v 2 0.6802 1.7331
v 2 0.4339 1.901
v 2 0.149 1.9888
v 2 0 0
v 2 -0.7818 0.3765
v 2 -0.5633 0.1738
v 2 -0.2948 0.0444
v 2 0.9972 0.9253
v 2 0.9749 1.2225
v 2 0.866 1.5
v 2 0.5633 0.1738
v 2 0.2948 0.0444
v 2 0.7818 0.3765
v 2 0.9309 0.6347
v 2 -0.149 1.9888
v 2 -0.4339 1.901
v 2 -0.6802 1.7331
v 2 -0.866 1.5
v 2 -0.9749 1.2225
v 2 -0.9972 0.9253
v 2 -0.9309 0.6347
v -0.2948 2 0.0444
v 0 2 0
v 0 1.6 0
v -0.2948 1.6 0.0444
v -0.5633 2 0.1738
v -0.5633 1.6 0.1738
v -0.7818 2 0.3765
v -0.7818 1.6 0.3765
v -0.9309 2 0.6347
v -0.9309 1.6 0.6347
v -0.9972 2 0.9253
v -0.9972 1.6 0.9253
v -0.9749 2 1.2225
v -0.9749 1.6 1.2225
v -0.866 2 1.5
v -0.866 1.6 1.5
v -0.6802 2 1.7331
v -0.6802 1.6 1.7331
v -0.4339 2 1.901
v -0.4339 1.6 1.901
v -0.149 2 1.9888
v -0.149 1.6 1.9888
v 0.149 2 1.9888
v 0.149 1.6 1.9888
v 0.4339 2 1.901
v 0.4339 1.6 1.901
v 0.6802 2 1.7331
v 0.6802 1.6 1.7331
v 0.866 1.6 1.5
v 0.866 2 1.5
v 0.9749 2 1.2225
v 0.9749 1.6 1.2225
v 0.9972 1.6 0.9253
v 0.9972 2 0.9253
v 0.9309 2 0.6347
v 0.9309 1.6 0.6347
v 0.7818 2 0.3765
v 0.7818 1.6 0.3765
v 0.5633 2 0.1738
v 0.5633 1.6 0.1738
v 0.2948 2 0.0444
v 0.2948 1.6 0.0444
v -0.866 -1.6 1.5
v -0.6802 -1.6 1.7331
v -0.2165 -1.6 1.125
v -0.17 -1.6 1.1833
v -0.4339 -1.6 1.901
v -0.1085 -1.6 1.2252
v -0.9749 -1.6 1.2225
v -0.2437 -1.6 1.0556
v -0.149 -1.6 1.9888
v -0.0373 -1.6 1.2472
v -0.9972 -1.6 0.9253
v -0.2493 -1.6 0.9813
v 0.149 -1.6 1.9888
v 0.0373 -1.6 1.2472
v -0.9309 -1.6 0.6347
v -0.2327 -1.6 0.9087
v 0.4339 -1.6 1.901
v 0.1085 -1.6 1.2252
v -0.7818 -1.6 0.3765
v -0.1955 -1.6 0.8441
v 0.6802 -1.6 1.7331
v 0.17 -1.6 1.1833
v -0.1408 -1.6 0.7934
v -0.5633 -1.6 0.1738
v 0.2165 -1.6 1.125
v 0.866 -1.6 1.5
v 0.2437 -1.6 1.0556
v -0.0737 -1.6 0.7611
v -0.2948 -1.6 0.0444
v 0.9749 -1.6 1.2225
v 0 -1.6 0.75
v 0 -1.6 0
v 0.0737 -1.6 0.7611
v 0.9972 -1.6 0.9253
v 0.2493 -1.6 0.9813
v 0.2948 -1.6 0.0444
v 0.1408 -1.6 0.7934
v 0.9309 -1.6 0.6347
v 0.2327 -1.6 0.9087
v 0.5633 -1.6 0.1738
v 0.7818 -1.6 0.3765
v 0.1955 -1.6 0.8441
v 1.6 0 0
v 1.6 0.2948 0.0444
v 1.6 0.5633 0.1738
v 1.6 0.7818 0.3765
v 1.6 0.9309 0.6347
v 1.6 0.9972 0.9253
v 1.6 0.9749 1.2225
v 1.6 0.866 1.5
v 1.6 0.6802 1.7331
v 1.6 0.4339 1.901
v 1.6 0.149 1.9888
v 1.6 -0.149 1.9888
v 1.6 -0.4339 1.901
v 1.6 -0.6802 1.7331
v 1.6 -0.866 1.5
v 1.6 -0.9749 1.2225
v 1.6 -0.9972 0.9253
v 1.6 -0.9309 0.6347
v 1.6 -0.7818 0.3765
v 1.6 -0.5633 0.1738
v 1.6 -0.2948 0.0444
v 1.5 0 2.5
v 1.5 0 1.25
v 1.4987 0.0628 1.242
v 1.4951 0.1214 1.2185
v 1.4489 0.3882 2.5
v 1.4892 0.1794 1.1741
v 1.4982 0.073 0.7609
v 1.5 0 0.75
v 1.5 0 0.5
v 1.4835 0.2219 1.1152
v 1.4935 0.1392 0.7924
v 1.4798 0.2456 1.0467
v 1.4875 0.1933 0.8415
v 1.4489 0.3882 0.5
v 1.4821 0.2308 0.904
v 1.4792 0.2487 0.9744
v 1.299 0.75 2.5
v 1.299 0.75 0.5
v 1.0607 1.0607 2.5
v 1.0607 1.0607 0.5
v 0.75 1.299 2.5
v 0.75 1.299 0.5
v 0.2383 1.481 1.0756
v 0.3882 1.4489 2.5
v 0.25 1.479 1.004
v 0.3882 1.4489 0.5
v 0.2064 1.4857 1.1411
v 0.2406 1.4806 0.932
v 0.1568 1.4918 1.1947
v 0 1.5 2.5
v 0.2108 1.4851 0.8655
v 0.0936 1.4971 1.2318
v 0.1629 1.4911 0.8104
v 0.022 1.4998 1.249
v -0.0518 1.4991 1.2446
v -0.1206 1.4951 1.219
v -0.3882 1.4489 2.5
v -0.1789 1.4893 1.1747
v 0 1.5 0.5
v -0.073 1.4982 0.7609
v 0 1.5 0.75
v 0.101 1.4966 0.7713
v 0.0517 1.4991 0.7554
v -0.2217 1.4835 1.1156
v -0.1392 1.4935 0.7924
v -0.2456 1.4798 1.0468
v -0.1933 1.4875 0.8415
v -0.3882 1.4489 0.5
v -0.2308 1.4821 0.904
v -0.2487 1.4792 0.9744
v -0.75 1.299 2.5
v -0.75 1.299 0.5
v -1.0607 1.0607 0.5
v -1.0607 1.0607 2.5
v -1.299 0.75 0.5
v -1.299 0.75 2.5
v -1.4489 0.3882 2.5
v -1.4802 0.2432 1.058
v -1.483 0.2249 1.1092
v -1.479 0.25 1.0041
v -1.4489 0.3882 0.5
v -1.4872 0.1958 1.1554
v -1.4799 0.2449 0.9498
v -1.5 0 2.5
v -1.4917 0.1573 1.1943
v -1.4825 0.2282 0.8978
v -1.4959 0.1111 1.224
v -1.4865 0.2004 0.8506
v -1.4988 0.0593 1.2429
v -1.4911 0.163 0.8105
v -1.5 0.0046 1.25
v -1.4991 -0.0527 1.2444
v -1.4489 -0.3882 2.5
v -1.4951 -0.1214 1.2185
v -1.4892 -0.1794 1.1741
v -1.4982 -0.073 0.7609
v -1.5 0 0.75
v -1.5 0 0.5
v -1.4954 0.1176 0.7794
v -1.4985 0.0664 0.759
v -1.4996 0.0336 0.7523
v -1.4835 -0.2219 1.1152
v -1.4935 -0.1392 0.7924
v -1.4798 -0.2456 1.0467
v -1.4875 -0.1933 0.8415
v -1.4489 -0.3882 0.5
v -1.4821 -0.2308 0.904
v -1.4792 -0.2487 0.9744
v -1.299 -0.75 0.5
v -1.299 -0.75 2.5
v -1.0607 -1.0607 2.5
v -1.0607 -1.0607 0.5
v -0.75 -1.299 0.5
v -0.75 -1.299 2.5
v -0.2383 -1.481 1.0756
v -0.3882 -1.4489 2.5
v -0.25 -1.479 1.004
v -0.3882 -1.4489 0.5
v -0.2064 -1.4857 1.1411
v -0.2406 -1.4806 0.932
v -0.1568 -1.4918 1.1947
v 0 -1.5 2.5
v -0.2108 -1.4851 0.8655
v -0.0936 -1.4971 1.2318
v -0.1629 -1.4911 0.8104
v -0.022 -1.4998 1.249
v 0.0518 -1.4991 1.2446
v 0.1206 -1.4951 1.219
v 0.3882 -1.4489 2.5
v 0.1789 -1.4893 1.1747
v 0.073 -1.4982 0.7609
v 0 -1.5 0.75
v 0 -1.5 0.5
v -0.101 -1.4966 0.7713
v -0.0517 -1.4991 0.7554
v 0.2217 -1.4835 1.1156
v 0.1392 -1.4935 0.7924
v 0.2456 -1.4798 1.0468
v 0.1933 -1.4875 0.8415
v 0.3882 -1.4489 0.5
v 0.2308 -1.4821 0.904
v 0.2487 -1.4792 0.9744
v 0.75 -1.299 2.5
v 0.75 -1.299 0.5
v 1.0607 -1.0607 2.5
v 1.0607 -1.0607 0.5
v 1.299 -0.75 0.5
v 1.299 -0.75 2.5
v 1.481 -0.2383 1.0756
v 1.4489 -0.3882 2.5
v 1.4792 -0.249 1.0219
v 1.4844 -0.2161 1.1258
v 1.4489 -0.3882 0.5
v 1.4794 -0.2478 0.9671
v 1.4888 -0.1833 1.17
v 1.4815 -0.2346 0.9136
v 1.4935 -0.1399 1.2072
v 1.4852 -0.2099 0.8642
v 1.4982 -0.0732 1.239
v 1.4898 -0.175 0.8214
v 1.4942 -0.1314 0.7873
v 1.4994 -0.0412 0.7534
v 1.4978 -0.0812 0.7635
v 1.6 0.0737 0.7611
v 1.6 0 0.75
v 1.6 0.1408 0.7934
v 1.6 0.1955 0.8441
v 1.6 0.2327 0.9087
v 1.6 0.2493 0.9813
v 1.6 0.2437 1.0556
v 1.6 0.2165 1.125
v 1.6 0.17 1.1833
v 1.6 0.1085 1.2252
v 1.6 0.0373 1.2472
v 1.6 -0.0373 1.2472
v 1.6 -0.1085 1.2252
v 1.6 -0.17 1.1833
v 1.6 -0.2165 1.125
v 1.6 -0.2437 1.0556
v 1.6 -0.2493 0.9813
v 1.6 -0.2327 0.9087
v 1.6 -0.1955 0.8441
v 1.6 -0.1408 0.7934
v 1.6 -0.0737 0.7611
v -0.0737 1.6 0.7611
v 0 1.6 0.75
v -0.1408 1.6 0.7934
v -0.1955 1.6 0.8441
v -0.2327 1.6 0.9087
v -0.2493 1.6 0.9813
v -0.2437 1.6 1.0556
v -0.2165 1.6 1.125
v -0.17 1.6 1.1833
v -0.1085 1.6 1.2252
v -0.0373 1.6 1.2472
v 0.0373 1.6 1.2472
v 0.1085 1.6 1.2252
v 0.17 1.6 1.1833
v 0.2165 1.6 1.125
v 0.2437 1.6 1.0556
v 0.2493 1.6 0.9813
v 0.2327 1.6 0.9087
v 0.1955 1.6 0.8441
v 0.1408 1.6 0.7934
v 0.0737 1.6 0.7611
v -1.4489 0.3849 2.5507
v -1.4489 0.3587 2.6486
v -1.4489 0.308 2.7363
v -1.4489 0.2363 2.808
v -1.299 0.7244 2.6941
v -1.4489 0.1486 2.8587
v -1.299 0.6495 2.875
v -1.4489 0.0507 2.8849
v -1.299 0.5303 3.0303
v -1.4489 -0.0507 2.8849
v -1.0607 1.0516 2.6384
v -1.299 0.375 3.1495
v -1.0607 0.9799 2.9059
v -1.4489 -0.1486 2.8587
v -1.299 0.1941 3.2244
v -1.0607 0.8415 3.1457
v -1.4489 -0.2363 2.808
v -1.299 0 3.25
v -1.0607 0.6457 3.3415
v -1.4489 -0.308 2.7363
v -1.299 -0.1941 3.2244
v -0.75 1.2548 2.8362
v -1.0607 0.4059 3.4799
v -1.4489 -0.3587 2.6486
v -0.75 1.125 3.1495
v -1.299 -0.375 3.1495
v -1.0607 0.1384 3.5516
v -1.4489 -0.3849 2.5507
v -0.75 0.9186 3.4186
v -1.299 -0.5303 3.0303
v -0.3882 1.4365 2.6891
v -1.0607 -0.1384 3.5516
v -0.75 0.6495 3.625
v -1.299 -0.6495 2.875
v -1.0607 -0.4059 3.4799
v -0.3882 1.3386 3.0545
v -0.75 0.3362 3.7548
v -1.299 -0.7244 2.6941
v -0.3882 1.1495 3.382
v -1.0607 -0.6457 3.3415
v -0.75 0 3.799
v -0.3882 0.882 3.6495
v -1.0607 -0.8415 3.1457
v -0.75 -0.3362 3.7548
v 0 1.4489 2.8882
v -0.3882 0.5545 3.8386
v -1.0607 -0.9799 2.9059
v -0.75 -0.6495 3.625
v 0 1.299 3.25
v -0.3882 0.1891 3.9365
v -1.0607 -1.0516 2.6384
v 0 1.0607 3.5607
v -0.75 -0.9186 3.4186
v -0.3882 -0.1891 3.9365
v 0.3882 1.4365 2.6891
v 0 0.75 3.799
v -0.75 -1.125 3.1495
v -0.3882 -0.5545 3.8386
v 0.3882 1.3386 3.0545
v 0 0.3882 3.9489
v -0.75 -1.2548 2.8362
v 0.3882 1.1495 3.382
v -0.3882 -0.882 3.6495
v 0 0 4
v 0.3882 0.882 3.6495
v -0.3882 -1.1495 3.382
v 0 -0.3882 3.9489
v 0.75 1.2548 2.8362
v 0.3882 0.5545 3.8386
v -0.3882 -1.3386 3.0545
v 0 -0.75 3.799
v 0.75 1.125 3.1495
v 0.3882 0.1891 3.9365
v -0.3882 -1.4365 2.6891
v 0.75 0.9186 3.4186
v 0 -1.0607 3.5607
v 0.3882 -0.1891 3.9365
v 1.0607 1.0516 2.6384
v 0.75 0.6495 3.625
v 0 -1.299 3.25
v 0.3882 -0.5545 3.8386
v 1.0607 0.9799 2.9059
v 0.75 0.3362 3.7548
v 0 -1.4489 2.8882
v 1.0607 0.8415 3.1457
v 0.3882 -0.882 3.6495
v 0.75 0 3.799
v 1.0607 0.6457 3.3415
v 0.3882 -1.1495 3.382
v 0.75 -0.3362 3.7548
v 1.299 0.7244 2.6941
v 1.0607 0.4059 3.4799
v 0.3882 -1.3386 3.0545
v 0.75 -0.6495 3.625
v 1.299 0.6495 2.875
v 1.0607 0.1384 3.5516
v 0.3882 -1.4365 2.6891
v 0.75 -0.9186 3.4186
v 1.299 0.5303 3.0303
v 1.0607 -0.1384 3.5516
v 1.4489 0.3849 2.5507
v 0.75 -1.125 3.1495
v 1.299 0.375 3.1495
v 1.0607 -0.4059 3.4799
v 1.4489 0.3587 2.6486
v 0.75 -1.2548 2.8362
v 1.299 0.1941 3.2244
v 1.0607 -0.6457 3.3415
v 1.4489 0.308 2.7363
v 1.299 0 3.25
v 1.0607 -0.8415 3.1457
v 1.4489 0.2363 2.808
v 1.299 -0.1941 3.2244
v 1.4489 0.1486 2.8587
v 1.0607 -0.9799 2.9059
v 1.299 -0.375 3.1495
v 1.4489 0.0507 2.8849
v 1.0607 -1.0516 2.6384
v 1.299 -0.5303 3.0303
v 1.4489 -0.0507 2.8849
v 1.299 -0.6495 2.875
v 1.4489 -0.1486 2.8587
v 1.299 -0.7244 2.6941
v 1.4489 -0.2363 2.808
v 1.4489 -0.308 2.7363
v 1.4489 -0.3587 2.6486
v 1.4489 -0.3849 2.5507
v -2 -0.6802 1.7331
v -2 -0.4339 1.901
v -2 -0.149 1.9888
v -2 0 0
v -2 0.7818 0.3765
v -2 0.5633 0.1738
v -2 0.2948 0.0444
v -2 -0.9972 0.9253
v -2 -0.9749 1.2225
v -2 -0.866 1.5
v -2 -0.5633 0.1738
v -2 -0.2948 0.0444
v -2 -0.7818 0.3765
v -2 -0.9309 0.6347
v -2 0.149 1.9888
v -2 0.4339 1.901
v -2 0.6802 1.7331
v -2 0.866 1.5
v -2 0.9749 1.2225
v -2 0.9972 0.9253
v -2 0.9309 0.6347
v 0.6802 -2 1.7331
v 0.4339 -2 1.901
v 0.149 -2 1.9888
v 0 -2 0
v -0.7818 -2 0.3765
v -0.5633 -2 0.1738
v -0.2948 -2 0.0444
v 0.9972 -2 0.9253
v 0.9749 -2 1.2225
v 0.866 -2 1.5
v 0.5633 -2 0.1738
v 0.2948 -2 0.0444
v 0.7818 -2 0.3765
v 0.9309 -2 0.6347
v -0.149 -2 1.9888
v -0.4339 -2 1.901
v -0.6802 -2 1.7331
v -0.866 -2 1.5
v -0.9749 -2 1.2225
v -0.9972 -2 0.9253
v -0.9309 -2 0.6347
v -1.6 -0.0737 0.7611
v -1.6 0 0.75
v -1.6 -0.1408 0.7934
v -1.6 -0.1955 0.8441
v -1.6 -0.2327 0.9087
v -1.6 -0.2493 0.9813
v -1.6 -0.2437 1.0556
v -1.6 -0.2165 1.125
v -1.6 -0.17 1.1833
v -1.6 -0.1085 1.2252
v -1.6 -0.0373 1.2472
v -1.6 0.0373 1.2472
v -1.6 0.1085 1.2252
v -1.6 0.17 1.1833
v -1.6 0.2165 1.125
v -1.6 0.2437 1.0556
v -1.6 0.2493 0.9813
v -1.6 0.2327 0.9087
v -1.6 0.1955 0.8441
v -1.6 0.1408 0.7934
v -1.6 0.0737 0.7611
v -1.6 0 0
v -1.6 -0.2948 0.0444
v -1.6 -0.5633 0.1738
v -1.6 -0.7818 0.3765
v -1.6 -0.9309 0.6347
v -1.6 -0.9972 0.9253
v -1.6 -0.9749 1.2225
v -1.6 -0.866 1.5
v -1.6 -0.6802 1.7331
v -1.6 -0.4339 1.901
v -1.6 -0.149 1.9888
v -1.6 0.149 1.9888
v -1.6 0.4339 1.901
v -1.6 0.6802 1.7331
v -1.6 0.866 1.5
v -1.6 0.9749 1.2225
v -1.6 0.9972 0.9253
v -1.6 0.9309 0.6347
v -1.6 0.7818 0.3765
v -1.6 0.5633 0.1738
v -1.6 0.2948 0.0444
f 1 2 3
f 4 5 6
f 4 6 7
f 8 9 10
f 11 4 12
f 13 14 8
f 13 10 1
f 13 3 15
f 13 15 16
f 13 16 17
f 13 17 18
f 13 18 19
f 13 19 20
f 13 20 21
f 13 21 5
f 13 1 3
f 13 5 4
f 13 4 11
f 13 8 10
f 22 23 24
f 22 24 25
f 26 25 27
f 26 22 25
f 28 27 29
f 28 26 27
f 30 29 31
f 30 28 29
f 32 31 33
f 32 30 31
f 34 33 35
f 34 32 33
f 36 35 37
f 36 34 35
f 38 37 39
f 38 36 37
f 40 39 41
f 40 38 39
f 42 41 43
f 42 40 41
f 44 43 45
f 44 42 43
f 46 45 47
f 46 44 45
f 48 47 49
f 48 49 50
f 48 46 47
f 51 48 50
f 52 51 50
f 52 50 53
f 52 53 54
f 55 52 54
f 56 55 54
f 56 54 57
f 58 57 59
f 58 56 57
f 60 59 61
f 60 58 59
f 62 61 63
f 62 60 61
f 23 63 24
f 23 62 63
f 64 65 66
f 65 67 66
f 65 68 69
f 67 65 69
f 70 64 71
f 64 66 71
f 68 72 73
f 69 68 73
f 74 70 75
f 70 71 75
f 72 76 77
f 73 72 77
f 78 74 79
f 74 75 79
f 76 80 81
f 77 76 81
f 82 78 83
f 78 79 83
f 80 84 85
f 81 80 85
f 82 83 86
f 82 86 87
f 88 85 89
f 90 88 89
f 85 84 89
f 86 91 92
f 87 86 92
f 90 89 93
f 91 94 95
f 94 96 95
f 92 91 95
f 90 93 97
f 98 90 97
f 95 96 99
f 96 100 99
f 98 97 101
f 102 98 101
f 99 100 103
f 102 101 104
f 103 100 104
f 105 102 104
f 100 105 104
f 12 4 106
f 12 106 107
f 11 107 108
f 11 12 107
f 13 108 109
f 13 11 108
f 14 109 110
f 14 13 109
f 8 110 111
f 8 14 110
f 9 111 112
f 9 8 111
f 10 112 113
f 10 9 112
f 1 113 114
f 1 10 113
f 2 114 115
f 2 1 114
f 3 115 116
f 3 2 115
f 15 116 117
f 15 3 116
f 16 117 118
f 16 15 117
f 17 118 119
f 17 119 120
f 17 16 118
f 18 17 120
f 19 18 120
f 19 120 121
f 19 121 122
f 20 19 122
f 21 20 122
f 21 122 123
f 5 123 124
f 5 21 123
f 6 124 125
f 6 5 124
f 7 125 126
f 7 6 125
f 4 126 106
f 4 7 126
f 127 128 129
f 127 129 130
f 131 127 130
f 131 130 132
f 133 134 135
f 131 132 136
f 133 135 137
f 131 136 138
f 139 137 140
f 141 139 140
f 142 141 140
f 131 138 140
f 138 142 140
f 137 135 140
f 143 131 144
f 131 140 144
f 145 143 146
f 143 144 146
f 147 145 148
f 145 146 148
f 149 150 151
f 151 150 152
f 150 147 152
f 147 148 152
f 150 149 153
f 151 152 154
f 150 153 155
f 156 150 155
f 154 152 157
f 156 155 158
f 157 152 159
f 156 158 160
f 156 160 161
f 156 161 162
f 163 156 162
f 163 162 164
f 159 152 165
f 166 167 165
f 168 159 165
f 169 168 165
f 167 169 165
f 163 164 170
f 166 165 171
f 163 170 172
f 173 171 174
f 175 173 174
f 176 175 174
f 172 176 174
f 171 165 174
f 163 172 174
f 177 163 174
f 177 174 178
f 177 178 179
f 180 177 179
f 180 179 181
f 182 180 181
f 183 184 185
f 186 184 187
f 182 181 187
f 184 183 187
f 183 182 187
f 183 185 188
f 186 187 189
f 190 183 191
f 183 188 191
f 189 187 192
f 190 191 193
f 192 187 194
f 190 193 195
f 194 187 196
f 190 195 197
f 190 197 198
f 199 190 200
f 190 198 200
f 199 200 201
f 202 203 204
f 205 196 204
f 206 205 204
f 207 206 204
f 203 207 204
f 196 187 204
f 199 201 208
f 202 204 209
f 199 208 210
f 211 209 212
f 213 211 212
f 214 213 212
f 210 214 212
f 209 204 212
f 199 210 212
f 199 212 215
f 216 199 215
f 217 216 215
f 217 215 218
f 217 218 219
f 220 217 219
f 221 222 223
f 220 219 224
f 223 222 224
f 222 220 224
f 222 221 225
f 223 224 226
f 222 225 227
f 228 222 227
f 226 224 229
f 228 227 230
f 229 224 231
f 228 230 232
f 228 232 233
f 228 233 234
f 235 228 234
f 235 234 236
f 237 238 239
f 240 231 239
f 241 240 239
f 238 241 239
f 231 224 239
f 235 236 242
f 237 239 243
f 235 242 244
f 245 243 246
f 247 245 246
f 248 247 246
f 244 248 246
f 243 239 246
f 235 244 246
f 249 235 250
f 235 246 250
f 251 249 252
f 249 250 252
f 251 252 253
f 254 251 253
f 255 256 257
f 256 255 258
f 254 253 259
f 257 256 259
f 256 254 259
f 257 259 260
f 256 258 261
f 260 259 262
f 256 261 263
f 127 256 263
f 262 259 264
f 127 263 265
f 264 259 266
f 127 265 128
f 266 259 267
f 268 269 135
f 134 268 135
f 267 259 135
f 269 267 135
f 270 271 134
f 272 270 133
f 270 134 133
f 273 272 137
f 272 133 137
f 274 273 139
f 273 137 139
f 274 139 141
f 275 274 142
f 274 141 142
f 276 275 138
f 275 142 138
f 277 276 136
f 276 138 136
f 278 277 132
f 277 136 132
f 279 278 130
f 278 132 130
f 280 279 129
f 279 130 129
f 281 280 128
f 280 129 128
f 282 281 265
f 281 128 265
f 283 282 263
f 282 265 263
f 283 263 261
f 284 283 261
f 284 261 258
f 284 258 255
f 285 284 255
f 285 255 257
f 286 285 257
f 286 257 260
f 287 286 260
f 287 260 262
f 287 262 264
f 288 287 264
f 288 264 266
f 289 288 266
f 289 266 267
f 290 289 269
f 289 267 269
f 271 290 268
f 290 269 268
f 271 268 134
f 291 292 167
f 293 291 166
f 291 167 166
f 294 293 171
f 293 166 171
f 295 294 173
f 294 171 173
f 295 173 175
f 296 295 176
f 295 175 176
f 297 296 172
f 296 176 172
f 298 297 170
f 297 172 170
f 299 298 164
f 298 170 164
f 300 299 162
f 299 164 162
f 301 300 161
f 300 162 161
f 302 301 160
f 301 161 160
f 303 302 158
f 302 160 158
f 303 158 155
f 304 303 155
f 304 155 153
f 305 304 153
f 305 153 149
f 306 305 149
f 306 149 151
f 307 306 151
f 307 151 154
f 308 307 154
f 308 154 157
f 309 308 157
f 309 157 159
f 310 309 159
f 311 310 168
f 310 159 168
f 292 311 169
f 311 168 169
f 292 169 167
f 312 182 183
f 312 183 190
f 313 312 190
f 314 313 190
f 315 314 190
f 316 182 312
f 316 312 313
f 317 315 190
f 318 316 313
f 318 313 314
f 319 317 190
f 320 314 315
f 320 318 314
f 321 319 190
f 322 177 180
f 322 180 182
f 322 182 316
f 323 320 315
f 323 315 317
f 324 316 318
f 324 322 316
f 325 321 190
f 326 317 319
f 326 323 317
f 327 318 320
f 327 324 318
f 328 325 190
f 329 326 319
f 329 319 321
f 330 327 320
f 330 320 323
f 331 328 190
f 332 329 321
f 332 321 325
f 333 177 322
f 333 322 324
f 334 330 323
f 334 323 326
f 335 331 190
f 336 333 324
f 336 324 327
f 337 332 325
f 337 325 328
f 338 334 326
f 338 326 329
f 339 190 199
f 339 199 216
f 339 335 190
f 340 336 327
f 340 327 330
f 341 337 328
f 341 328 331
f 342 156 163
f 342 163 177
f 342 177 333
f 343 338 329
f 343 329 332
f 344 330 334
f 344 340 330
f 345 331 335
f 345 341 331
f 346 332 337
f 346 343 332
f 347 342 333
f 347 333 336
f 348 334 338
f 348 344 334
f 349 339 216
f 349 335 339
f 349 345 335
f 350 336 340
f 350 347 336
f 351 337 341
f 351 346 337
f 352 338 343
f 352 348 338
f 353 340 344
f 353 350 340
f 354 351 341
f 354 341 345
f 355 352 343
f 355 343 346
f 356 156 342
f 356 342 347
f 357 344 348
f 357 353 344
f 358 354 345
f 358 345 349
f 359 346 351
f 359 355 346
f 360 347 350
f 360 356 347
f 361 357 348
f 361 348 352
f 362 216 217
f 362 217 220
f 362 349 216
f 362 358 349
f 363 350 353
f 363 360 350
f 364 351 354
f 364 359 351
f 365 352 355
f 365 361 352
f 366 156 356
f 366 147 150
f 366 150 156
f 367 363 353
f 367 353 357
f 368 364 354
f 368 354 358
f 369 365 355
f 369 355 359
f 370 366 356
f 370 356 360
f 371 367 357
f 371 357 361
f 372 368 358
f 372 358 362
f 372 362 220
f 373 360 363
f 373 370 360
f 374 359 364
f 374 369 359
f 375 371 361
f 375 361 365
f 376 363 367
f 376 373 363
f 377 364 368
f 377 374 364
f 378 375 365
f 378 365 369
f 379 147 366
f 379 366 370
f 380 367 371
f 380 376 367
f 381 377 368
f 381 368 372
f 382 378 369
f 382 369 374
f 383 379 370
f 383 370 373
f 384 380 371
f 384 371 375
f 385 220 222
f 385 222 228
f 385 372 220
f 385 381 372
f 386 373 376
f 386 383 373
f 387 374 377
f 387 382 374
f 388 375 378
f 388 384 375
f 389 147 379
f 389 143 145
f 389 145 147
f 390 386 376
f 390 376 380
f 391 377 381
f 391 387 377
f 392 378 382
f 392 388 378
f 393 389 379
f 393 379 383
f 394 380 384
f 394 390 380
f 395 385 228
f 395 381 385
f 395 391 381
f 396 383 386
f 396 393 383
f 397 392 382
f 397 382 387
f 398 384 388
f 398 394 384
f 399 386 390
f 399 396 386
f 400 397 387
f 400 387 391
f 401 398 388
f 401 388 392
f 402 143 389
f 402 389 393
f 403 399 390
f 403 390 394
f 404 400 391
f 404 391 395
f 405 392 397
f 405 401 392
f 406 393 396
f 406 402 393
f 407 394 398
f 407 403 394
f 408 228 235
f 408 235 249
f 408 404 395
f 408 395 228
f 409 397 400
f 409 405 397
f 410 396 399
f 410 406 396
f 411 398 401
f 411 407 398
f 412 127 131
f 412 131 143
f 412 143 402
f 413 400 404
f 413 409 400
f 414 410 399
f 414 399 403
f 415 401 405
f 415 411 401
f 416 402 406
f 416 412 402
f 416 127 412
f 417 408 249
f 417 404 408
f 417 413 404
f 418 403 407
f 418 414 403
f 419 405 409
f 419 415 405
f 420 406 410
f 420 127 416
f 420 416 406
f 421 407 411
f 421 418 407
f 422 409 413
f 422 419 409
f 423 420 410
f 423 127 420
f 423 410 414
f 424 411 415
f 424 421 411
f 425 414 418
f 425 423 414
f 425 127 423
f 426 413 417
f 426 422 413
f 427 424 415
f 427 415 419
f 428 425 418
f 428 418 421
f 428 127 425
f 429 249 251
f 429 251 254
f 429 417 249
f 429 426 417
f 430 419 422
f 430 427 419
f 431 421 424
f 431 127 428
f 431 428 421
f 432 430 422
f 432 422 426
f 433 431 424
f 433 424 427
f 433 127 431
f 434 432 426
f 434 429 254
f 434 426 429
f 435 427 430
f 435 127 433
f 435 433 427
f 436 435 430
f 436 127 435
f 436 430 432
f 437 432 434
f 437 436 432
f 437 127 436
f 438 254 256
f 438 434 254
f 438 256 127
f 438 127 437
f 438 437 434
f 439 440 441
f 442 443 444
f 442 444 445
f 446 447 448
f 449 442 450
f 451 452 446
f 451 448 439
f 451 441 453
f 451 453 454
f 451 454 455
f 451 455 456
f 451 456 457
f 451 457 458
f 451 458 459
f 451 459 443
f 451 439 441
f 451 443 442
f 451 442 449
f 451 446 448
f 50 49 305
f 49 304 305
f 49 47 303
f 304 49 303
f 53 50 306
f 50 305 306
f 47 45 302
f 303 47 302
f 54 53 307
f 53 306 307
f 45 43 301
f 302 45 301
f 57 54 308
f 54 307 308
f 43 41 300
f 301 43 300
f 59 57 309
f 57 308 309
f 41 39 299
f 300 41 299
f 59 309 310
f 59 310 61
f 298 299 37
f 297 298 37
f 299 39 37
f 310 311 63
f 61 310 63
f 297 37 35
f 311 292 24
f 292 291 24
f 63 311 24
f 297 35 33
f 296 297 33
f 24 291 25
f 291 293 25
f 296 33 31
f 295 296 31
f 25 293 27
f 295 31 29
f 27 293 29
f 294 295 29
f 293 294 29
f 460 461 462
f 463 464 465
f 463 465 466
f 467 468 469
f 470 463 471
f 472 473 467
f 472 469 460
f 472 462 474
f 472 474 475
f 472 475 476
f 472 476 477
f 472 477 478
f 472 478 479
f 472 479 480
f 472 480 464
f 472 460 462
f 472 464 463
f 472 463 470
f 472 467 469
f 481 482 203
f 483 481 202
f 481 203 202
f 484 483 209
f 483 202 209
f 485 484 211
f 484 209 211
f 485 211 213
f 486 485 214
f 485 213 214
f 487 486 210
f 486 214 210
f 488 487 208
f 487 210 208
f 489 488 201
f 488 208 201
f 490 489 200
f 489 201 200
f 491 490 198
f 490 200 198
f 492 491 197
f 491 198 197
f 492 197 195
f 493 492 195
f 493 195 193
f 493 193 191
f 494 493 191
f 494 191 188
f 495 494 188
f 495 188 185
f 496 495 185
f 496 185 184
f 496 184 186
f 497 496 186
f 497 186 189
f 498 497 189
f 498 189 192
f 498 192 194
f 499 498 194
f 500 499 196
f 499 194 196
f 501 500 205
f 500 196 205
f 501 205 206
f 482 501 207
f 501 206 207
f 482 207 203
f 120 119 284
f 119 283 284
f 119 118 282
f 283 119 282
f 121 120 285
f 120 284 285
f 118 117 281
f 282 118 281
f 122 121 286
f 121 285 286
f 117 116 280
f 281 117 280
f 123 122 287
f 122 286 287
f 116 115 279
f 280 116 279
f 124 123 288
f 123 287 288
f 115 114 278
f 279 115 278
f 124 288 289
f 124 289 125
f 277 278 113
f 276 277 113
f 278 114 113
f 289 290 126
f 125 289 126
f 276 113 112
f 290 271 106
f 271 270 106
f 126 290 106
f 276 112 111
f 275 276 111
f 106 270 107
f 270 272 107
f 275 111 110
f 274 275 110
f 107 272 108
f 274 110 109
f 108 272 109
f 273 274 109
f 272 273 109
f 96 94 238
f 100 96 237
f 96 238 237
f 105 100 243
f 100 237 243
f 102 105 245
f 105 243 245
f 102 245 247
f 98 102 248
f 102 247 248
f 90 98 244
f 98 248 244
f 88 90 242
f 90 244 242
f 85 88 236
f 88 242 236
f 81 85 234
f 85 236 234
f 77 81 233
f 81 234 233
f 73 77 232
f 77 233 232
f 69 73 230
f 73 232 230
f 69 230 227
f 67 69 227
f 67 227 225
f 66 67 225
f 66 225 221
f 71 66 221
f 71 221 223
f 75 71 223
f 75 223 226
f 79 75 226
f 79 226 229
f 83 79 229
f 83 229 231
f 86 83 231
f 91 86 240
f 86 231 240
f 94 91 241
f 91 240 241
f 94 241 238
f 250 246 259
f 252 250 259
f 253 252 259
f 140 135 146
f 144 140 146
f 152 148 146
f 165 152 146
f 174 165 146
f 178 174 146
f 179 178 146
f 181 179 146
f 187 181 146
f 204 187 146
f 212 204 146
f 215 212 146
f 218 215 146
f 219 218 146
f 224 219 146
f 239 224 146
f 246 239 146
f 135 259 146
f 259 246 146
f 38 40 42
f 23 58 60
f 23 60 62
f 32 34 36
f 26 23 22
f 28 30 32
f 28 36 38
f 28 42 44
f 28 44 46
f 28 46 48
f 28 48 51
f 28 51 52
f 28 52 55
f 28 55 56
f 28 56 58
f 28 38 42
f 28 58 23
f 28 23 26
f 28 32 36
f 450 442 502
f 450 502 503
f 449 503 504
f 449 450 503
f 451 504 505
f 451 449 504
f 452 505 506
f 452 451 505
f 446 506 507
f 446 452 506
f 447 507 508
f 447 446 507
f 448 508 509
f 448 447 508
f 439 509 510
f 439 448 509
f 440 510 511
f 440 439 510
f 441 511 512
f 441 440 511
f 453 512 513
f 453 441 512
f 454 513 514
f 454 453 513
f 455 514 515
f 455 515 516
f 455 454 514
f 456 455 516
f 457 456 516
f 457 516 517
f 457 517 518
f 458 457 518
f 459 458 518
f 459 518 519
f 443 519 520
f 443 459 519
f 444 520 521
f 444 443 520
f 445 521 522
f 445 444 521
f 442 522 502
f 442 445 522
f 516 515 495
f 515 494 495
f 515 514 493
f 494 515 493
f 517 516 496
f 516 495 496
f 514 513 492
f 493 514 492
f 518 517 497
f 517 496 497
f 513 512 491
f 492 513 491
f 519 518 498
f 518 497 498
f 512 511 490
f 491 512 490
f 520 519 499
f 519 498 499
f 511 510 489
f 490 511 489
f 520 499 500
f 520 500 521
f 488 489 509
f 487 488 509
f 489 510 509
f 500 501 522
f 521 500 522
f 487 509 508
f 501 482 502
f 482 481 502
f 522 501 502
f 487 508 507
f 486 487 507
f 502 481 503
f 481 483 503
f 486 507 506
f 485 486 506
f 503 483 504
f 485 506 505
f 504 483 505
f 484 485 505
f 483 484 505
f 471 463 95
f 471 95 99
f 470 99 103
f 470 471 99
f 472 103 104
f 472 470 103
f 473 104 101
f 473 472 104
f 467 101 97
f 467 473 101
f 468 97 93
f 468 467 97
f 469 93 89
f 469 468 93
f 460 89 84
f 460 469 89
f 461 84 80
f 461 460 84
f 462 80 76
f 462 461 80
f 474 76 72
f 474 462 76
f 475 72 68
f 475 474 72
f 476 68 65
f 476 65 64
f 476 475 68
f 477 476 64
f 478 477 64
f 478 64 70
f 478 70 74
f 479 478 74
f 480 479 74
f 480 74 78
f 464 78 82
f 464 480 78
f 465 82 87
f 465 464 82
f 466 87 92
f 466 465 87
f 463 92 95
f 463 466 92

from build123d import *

# Parameters (mm, degrees)
BOSS_EXTRUDE1_START = 0.5
SKETCH1_R           = 1.5
BOSS_EXTRUDE1_DEPTH = 2
REVOLVE1_ANGLE      = 180
SKETCH3_R           = 0.25
BOSS_EXTRUDE2_DEPTH = 2
SKETCH4_R           = 1
BOSS_EXTRUDE3_DEPTH = 0.4
CIRPATTERN2_COUNT   = 4


with BuildPart() as part:
    # Sketch1 → Boss-Extrude1 (new body)
    with BuildSketch(Plane.XY.offset(BOSS_EXTRUDE1_START)):
        Circle(SKETCH1_R)
    extrude(amount=BOSS_EXTRUDE1_DEPTH)

    # Sketch2 → Revolve1 (revolve)
    with BuildSketch(Plane.XY.offset(2.5)):
        with BuildLine():
            Line((1.5, 0), (-1.5, 0))
            ThreePointArc((-1.5, 0), (0, 1.5), (1.5, 0))
        make_face()
    revolve(axis=Axis((1.5, 0, 2.5), (1, 0, 0)), revolution_arc=REVOLVE1_ANGLE)

    # Sketch3 → Boss-Extrude2 (add)
    with BuildSketch(Plane(origin=(0, 0, 0), x_dir=(0, 0, -1), z_dir=(1, 0, 0))):
        with Locations((-1, 0)):
            Circle(SKETCH3_R)
    boss_extrude2 = extrude(amount=BOSS_EXTRUDE2_DEPTH)

    # Sketch4 → Boss-Extrude3 (add)
    with BuildSketch(Plane(origin=(2, 0, 0), x_dir=(0, 0, -1), z_dir=(1, 0, 0))):
        with Locations((-1, 0)):
            Circle(SKETCH4_R)
    boss_extrude3 = extrude(amount=-BOSS_EXTRUDE3_DEPTH)

    # CirPattern2: Boss-Extrude2, Boss-Extrude3 ×4 about axis
    cirpattern2_axis = Axis((0, 0, 0), (0, 0, 1))
    for i in range(1, CIRPATTERN2_COUNT):
        add(boss_extrude2.rotate(cirpattern2_axis, i * 360 / CIRPATTERN2_COUNT))
        add(boss_extrude3.rotate(cirpattern2_axis, i * 360 / CIRPATTERN2_COUNT))


solid = part.part
